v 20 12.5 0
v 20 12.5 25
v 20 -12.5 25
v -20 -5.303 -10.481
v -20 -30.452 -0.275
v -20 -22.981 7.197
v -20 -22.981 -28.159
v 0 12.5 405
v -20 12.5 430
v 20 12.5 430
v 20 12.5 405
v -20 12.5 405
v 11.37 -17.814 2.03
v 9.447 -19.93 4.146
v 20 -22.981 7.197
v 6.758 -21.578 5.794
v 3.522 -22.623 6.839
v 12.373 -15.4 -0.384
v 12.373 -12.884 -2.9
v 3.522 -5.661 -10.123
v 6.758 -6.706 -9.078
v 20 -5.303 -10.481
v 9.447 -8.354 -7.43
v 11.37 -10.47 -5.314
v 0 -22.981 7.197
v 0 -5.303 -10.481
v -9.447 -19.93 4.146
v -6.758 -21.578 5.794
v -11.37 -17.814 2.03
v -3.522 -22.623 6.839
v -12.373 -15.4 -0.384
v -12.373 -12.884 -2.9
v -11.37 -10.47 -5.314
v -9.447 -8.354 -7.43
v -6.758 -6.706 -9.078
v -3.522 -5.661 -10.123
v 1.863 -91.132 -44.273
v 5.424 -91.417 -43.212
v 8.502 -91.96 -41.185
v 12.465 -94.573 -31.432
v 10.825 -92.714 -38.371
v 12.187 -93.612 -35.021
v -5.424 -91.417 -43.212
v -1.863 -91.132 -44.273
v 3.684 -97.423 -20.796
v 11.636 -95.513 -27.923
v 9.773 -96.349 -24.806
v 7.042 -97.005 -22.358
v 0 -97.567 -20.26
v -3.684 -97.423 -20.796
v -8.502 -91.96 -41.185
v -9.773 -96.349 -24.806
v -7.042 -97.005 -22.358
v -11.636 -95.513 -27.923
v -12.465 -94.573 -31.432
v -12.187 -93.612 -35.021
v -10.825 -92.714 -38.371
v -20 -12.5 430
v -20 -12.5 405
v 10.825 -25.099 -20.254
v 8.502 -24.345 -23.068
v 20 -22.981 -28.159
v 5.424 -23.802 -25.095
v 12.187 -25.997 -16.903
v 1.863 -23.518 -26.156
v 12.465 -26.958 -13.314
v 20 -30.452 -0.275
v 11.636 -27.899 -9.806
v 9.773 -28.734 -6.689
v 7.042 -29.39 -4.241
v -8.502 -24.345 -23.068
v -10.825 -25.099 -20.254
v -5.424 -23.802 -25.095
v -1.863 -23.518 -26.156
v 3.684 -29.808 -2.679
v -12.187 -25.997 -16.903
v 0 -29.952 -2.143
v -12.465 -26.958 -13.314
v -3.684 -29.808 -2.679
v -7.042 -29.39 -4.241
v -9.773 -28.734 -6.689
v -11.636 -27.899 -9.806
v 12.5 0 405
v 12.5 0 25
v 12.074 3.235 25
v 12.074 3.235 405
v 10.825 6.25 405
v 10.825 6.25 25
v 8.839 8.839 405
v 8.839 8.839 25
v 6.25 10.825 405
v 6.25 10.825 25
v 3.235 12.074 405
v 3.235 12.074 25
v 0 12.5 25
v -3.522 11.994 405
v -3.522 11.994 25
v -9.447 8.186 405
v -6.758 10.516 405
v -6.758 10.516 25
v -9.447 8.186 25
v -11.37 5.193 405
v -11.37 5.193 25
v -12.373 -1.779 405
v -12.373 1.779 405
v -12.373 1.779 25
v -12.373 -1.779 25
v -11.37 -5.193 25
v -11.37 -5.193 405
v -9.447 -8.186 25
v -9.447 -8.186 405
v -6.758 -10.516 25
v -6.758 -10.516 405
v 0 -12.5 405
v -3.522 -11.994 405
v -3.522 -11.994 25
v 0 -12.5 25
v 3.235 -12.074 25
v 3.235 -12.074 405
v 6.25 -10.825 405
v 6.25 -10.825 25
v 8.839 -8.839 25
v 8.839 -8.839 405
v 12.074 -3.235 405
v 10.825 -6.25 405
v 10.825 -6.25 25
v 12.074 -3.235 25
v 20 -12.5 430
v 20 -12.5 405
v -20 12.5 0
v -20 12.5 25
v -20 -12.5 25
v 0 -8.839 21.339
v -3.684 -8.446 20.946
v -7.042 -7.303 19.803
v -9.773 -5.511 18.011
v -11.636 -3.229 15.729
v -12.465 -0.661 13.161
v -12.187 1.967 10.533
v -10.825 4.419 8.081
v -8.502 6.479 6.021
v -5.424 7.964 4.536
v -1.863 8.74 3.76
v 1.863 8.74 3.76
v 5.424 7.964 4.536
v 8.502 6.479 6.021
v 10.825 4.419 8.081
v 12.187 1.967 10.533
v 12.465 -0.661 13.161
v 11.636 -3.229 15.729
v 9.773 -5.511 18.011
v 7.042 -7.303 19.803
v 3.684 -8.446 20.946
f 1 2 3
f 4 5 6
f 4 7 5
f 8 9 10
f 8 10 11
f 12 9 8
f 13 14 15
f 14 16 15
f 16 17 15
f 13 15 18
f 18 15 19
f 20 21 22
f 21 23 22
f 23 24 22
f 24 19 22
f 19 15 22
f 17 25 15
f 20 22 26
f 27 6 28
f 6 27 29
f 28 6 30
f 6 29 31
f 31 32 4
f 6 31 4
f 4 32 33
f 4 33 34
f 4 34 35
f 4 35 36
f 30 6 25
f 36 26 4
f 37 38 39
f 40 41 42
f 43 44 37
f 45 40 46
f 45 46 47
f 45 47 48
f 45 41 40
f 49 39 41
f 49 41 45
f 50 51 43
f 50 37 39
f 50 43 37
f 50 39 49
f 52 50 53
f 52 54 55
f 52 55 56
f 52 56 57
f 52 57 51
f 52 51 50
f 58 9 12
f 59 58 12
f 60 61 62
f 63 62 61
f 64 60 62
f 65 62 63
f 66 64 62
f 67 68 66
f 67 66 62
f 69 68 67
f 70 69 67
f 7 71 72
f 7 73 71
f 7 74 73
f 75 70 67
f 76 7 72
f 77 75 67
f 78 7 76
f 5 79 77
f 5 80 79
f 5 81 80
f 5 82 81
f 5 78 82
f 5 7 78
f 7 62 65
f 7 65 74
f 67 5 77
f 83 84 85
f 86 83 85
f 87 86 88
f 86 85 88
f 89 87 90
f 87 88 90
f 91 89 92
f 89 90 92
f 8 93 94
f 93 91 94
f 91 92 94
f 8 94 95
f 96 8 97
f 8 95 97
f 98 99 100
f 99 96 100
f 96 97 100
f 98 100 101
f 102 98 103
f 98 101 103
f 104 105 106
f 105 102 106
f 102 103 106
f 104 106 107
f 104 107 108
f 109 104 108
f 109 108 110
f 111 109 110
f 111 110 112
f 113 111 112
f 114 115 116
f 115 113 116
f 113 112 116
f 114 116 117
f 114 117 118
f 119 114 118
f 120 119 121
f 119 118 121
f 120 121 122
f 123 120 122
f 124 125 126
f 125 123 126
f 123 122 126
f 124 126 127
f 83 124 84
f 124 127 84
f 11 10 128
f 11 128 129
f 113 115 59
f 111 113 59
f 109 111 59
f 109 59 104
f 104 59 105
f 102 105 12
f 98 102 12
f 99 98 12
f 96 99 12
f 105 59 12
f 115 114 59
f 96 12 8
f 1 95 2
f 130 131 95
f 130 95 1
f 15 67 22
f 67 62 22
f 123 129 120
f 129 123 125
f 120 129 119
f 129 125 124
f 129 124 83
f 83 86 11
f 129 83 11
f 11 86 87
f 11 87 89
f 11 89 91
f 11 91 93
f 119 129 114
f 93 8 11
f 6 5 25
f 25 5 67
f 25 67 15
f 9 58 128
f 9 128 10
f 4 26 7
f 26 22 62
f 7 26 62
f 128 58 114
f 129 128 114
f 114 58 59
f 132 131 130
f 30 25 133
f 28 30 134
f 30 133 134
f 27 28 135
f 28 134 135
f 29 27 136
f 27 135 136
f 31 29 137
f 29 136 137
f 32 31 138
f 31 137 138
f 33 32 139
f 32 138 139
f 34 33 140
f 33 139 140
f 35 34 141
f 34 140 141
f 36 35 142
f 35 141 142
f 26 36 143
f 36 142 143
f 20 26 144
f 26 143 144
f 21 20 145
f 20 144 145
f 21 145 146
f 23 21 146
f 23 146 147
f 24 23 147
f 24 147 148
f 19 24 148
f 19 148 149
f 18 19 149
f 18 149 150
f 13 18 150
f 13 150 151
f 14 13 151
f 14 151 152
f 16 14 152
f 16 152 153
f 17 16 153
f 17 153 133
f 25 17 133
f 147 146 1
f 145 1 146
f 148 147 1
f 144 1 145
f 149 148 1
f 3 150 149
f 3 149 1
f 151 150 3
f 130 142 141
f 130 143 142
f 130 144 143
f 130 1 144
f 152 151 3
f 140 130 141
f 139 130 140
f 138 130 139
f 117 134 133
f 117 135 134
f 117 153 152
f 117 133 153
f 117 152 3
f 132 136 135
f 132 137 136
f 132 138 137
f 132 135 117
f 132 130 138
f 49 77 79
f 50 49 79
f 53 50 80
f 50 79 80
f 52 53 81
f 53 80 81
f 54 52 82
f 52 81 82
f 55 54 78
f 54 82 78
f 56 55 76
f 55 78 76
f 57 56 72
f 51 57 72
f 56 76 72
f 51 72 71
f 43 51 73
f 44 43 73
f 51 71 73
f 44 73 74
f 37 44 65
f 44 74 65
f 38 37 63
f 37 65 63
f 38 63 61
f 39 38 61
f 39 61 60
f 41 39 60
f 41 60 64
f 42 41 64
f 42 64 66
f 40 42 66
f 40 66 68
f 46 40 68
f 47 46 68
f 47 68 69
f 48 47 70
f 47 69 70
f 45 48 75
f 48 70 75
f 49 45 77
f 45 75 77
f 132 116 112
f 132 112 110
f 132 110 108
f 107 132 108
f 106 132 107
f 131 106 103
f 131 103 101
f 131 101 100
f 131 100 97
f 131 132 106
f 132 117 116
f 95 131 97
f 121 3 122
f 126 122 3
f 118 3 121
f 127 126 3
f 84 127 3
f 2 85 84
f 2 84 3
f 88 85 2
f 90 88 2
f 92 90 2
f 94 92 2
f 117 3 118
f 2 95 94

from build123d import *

# Parameters (mm, degrees)
ESQUISSE3_R                  = 12.5
BOSS_EXTRU_1_DEPTH           = 430
BOSS_EXTRU_2_DEPTH           = 20
BOSS_EXTRU_2_DEPTH_BACK      = 20
ESQUISSE4_W                  = 25
ESQUISSE4_H                  = 25
ENL_V_MAT_EXTRU_1_DEPTH      = 433.037324776
ENL_V_MAT_EXTRU_1_DEPTH_BACK = 433.037324776
ESQUISSE9_R                  = 12.5
BOSS_EXTRU_3_DEPTH           = 20
BOSS_EXTRU_4_DEPTH           = 40
ENL_V_MAT_EXTRU_2_DEPTH      = 434.766210072
ENL_V_MAT_EXTRU_2_DEPTH_BACK = 434.766210072
ESQUISSE12_R                 = 12.5
BOSS_EXTRU_5_DEPTH           = 70


with BuildPart() as part:
    # Esquisse3 → Boss.-Extru.1 (new body)
    with BuildSketch(Plane.XY):
        Circle(ESQUISSE3_R)
    extrude(amount=BOSS_EXTRU_1_DEPTH)

    # Esquisse4 → Boss.-Extru.2 (add, two sides: drawn at the far end of the back side and taken through both)
    with BuildSketch(Plane(origin=(0, 0, 0), x_dir=(0, 0, -1), z_dir=(1, 0, 0)).offset(-BOSS_EXTRU_2_DEPTH_BACK)):
        with Locations((-417.5, 0)):
            Rectangle(ESQUISSE4_W, ESQUISSE4_H)
        with Locations((-12.5, 0)):
            Rectangle(ESQUISSE4_W, ESQUISSE4_H)
    extrude(amount=BOSS_EXTRU_2_DEPTH + BOSS_EXTRU_2_DEPTH_BACK)

    # Esquisse8 → Enlèv. mat.-Extru.1 (cut, two sides: drawn at the far end of the back side and taken through both)
    with BuildSketch(Plane(origin=(20, 0, 0), x_dir=(0, 0, -1), z_dir=(1, 0, 0)).offset(-ENL_V_MAT_EXTRU_1_DEPTH_BACK)):
        Polygon((0, 12.5), (-25, -12.5), (0, -12.5), align=None)
    extrude(amount=ENL_V_MAT_EXTRU_1_DEPTH + ENL_V_MAT_EXTRU_1_DEPTH_BACK, mode=Mode.SUBTRACT)

    # Esquisse9 → Boss.-Extru.3 (add)
    with BuildSketch(Plane(origin=(0, 6.25, 6.25), x_dir=(-1, 0, 0), z_dir=(0, -0.7071067811865462, -0.707106781186549))):
        with Locations(Location((0, -8.838834765, 0), (0, 0, 270))):
            Circle(ESQUISSE9_R)
    extrude(amount=BOSS_EXTRU_3_DEPTH)

    # Esquisse10 → Boss.-Extru.4 (add)
    with BuildSketch(Plane(origin=(20, 0, 0), x_dir=(0, 0, -1), z_dir=(1, 0, 0))):
        Polygon((-7.196699141, -22.980970389), (10.480970389, -5.303300859), (28.158639918, -22.980970389), (10.480970389, -40.658639918), align=None)
    extrude(amount=-BOSS_EXTRU_4_DEPTH)

    # Esquisse11 → Enlèv. mat.-Extru.2 (cut, two sides: drawn at the far end of the back side and taken through both)
    with BuildSketch(Plane(origin=(20, 0, 0), x_dir=(0, 0, -1), z_dir=(1, 0, 0)).offset(-ENL_V_MAT_EXTRU_2_DEPTH_BACK)):
        Polygon((28.158639918, -22.980970389), (0.274763127, -30.452432657), (10.480970389, -40.658639918), align=None)
    extrude(amount=ENL_V_MAT_EXTRU_2_DEPTH + ENL_V_MAT_EXTRU_2_DEPTH_BACK, mode=Mode.SUBTRACT)

    # Esquisse12 → Boss.-Extru.5 (add)
    with BuildSketch(Plane(origin=(0, -28.481197254, -7.631513804), x_dir=(1, 0, 0), z_dir=(0, -0.9659258262890676, -0.2588190451025233))):
        with Locations(Location((0, -6.817487989, 0), (0, 0, 90))):
            Circle(ESQUISSE12_R)
    extrude(amount=BOSS_EXTRU_5_DEPTH)


solid = part.part
